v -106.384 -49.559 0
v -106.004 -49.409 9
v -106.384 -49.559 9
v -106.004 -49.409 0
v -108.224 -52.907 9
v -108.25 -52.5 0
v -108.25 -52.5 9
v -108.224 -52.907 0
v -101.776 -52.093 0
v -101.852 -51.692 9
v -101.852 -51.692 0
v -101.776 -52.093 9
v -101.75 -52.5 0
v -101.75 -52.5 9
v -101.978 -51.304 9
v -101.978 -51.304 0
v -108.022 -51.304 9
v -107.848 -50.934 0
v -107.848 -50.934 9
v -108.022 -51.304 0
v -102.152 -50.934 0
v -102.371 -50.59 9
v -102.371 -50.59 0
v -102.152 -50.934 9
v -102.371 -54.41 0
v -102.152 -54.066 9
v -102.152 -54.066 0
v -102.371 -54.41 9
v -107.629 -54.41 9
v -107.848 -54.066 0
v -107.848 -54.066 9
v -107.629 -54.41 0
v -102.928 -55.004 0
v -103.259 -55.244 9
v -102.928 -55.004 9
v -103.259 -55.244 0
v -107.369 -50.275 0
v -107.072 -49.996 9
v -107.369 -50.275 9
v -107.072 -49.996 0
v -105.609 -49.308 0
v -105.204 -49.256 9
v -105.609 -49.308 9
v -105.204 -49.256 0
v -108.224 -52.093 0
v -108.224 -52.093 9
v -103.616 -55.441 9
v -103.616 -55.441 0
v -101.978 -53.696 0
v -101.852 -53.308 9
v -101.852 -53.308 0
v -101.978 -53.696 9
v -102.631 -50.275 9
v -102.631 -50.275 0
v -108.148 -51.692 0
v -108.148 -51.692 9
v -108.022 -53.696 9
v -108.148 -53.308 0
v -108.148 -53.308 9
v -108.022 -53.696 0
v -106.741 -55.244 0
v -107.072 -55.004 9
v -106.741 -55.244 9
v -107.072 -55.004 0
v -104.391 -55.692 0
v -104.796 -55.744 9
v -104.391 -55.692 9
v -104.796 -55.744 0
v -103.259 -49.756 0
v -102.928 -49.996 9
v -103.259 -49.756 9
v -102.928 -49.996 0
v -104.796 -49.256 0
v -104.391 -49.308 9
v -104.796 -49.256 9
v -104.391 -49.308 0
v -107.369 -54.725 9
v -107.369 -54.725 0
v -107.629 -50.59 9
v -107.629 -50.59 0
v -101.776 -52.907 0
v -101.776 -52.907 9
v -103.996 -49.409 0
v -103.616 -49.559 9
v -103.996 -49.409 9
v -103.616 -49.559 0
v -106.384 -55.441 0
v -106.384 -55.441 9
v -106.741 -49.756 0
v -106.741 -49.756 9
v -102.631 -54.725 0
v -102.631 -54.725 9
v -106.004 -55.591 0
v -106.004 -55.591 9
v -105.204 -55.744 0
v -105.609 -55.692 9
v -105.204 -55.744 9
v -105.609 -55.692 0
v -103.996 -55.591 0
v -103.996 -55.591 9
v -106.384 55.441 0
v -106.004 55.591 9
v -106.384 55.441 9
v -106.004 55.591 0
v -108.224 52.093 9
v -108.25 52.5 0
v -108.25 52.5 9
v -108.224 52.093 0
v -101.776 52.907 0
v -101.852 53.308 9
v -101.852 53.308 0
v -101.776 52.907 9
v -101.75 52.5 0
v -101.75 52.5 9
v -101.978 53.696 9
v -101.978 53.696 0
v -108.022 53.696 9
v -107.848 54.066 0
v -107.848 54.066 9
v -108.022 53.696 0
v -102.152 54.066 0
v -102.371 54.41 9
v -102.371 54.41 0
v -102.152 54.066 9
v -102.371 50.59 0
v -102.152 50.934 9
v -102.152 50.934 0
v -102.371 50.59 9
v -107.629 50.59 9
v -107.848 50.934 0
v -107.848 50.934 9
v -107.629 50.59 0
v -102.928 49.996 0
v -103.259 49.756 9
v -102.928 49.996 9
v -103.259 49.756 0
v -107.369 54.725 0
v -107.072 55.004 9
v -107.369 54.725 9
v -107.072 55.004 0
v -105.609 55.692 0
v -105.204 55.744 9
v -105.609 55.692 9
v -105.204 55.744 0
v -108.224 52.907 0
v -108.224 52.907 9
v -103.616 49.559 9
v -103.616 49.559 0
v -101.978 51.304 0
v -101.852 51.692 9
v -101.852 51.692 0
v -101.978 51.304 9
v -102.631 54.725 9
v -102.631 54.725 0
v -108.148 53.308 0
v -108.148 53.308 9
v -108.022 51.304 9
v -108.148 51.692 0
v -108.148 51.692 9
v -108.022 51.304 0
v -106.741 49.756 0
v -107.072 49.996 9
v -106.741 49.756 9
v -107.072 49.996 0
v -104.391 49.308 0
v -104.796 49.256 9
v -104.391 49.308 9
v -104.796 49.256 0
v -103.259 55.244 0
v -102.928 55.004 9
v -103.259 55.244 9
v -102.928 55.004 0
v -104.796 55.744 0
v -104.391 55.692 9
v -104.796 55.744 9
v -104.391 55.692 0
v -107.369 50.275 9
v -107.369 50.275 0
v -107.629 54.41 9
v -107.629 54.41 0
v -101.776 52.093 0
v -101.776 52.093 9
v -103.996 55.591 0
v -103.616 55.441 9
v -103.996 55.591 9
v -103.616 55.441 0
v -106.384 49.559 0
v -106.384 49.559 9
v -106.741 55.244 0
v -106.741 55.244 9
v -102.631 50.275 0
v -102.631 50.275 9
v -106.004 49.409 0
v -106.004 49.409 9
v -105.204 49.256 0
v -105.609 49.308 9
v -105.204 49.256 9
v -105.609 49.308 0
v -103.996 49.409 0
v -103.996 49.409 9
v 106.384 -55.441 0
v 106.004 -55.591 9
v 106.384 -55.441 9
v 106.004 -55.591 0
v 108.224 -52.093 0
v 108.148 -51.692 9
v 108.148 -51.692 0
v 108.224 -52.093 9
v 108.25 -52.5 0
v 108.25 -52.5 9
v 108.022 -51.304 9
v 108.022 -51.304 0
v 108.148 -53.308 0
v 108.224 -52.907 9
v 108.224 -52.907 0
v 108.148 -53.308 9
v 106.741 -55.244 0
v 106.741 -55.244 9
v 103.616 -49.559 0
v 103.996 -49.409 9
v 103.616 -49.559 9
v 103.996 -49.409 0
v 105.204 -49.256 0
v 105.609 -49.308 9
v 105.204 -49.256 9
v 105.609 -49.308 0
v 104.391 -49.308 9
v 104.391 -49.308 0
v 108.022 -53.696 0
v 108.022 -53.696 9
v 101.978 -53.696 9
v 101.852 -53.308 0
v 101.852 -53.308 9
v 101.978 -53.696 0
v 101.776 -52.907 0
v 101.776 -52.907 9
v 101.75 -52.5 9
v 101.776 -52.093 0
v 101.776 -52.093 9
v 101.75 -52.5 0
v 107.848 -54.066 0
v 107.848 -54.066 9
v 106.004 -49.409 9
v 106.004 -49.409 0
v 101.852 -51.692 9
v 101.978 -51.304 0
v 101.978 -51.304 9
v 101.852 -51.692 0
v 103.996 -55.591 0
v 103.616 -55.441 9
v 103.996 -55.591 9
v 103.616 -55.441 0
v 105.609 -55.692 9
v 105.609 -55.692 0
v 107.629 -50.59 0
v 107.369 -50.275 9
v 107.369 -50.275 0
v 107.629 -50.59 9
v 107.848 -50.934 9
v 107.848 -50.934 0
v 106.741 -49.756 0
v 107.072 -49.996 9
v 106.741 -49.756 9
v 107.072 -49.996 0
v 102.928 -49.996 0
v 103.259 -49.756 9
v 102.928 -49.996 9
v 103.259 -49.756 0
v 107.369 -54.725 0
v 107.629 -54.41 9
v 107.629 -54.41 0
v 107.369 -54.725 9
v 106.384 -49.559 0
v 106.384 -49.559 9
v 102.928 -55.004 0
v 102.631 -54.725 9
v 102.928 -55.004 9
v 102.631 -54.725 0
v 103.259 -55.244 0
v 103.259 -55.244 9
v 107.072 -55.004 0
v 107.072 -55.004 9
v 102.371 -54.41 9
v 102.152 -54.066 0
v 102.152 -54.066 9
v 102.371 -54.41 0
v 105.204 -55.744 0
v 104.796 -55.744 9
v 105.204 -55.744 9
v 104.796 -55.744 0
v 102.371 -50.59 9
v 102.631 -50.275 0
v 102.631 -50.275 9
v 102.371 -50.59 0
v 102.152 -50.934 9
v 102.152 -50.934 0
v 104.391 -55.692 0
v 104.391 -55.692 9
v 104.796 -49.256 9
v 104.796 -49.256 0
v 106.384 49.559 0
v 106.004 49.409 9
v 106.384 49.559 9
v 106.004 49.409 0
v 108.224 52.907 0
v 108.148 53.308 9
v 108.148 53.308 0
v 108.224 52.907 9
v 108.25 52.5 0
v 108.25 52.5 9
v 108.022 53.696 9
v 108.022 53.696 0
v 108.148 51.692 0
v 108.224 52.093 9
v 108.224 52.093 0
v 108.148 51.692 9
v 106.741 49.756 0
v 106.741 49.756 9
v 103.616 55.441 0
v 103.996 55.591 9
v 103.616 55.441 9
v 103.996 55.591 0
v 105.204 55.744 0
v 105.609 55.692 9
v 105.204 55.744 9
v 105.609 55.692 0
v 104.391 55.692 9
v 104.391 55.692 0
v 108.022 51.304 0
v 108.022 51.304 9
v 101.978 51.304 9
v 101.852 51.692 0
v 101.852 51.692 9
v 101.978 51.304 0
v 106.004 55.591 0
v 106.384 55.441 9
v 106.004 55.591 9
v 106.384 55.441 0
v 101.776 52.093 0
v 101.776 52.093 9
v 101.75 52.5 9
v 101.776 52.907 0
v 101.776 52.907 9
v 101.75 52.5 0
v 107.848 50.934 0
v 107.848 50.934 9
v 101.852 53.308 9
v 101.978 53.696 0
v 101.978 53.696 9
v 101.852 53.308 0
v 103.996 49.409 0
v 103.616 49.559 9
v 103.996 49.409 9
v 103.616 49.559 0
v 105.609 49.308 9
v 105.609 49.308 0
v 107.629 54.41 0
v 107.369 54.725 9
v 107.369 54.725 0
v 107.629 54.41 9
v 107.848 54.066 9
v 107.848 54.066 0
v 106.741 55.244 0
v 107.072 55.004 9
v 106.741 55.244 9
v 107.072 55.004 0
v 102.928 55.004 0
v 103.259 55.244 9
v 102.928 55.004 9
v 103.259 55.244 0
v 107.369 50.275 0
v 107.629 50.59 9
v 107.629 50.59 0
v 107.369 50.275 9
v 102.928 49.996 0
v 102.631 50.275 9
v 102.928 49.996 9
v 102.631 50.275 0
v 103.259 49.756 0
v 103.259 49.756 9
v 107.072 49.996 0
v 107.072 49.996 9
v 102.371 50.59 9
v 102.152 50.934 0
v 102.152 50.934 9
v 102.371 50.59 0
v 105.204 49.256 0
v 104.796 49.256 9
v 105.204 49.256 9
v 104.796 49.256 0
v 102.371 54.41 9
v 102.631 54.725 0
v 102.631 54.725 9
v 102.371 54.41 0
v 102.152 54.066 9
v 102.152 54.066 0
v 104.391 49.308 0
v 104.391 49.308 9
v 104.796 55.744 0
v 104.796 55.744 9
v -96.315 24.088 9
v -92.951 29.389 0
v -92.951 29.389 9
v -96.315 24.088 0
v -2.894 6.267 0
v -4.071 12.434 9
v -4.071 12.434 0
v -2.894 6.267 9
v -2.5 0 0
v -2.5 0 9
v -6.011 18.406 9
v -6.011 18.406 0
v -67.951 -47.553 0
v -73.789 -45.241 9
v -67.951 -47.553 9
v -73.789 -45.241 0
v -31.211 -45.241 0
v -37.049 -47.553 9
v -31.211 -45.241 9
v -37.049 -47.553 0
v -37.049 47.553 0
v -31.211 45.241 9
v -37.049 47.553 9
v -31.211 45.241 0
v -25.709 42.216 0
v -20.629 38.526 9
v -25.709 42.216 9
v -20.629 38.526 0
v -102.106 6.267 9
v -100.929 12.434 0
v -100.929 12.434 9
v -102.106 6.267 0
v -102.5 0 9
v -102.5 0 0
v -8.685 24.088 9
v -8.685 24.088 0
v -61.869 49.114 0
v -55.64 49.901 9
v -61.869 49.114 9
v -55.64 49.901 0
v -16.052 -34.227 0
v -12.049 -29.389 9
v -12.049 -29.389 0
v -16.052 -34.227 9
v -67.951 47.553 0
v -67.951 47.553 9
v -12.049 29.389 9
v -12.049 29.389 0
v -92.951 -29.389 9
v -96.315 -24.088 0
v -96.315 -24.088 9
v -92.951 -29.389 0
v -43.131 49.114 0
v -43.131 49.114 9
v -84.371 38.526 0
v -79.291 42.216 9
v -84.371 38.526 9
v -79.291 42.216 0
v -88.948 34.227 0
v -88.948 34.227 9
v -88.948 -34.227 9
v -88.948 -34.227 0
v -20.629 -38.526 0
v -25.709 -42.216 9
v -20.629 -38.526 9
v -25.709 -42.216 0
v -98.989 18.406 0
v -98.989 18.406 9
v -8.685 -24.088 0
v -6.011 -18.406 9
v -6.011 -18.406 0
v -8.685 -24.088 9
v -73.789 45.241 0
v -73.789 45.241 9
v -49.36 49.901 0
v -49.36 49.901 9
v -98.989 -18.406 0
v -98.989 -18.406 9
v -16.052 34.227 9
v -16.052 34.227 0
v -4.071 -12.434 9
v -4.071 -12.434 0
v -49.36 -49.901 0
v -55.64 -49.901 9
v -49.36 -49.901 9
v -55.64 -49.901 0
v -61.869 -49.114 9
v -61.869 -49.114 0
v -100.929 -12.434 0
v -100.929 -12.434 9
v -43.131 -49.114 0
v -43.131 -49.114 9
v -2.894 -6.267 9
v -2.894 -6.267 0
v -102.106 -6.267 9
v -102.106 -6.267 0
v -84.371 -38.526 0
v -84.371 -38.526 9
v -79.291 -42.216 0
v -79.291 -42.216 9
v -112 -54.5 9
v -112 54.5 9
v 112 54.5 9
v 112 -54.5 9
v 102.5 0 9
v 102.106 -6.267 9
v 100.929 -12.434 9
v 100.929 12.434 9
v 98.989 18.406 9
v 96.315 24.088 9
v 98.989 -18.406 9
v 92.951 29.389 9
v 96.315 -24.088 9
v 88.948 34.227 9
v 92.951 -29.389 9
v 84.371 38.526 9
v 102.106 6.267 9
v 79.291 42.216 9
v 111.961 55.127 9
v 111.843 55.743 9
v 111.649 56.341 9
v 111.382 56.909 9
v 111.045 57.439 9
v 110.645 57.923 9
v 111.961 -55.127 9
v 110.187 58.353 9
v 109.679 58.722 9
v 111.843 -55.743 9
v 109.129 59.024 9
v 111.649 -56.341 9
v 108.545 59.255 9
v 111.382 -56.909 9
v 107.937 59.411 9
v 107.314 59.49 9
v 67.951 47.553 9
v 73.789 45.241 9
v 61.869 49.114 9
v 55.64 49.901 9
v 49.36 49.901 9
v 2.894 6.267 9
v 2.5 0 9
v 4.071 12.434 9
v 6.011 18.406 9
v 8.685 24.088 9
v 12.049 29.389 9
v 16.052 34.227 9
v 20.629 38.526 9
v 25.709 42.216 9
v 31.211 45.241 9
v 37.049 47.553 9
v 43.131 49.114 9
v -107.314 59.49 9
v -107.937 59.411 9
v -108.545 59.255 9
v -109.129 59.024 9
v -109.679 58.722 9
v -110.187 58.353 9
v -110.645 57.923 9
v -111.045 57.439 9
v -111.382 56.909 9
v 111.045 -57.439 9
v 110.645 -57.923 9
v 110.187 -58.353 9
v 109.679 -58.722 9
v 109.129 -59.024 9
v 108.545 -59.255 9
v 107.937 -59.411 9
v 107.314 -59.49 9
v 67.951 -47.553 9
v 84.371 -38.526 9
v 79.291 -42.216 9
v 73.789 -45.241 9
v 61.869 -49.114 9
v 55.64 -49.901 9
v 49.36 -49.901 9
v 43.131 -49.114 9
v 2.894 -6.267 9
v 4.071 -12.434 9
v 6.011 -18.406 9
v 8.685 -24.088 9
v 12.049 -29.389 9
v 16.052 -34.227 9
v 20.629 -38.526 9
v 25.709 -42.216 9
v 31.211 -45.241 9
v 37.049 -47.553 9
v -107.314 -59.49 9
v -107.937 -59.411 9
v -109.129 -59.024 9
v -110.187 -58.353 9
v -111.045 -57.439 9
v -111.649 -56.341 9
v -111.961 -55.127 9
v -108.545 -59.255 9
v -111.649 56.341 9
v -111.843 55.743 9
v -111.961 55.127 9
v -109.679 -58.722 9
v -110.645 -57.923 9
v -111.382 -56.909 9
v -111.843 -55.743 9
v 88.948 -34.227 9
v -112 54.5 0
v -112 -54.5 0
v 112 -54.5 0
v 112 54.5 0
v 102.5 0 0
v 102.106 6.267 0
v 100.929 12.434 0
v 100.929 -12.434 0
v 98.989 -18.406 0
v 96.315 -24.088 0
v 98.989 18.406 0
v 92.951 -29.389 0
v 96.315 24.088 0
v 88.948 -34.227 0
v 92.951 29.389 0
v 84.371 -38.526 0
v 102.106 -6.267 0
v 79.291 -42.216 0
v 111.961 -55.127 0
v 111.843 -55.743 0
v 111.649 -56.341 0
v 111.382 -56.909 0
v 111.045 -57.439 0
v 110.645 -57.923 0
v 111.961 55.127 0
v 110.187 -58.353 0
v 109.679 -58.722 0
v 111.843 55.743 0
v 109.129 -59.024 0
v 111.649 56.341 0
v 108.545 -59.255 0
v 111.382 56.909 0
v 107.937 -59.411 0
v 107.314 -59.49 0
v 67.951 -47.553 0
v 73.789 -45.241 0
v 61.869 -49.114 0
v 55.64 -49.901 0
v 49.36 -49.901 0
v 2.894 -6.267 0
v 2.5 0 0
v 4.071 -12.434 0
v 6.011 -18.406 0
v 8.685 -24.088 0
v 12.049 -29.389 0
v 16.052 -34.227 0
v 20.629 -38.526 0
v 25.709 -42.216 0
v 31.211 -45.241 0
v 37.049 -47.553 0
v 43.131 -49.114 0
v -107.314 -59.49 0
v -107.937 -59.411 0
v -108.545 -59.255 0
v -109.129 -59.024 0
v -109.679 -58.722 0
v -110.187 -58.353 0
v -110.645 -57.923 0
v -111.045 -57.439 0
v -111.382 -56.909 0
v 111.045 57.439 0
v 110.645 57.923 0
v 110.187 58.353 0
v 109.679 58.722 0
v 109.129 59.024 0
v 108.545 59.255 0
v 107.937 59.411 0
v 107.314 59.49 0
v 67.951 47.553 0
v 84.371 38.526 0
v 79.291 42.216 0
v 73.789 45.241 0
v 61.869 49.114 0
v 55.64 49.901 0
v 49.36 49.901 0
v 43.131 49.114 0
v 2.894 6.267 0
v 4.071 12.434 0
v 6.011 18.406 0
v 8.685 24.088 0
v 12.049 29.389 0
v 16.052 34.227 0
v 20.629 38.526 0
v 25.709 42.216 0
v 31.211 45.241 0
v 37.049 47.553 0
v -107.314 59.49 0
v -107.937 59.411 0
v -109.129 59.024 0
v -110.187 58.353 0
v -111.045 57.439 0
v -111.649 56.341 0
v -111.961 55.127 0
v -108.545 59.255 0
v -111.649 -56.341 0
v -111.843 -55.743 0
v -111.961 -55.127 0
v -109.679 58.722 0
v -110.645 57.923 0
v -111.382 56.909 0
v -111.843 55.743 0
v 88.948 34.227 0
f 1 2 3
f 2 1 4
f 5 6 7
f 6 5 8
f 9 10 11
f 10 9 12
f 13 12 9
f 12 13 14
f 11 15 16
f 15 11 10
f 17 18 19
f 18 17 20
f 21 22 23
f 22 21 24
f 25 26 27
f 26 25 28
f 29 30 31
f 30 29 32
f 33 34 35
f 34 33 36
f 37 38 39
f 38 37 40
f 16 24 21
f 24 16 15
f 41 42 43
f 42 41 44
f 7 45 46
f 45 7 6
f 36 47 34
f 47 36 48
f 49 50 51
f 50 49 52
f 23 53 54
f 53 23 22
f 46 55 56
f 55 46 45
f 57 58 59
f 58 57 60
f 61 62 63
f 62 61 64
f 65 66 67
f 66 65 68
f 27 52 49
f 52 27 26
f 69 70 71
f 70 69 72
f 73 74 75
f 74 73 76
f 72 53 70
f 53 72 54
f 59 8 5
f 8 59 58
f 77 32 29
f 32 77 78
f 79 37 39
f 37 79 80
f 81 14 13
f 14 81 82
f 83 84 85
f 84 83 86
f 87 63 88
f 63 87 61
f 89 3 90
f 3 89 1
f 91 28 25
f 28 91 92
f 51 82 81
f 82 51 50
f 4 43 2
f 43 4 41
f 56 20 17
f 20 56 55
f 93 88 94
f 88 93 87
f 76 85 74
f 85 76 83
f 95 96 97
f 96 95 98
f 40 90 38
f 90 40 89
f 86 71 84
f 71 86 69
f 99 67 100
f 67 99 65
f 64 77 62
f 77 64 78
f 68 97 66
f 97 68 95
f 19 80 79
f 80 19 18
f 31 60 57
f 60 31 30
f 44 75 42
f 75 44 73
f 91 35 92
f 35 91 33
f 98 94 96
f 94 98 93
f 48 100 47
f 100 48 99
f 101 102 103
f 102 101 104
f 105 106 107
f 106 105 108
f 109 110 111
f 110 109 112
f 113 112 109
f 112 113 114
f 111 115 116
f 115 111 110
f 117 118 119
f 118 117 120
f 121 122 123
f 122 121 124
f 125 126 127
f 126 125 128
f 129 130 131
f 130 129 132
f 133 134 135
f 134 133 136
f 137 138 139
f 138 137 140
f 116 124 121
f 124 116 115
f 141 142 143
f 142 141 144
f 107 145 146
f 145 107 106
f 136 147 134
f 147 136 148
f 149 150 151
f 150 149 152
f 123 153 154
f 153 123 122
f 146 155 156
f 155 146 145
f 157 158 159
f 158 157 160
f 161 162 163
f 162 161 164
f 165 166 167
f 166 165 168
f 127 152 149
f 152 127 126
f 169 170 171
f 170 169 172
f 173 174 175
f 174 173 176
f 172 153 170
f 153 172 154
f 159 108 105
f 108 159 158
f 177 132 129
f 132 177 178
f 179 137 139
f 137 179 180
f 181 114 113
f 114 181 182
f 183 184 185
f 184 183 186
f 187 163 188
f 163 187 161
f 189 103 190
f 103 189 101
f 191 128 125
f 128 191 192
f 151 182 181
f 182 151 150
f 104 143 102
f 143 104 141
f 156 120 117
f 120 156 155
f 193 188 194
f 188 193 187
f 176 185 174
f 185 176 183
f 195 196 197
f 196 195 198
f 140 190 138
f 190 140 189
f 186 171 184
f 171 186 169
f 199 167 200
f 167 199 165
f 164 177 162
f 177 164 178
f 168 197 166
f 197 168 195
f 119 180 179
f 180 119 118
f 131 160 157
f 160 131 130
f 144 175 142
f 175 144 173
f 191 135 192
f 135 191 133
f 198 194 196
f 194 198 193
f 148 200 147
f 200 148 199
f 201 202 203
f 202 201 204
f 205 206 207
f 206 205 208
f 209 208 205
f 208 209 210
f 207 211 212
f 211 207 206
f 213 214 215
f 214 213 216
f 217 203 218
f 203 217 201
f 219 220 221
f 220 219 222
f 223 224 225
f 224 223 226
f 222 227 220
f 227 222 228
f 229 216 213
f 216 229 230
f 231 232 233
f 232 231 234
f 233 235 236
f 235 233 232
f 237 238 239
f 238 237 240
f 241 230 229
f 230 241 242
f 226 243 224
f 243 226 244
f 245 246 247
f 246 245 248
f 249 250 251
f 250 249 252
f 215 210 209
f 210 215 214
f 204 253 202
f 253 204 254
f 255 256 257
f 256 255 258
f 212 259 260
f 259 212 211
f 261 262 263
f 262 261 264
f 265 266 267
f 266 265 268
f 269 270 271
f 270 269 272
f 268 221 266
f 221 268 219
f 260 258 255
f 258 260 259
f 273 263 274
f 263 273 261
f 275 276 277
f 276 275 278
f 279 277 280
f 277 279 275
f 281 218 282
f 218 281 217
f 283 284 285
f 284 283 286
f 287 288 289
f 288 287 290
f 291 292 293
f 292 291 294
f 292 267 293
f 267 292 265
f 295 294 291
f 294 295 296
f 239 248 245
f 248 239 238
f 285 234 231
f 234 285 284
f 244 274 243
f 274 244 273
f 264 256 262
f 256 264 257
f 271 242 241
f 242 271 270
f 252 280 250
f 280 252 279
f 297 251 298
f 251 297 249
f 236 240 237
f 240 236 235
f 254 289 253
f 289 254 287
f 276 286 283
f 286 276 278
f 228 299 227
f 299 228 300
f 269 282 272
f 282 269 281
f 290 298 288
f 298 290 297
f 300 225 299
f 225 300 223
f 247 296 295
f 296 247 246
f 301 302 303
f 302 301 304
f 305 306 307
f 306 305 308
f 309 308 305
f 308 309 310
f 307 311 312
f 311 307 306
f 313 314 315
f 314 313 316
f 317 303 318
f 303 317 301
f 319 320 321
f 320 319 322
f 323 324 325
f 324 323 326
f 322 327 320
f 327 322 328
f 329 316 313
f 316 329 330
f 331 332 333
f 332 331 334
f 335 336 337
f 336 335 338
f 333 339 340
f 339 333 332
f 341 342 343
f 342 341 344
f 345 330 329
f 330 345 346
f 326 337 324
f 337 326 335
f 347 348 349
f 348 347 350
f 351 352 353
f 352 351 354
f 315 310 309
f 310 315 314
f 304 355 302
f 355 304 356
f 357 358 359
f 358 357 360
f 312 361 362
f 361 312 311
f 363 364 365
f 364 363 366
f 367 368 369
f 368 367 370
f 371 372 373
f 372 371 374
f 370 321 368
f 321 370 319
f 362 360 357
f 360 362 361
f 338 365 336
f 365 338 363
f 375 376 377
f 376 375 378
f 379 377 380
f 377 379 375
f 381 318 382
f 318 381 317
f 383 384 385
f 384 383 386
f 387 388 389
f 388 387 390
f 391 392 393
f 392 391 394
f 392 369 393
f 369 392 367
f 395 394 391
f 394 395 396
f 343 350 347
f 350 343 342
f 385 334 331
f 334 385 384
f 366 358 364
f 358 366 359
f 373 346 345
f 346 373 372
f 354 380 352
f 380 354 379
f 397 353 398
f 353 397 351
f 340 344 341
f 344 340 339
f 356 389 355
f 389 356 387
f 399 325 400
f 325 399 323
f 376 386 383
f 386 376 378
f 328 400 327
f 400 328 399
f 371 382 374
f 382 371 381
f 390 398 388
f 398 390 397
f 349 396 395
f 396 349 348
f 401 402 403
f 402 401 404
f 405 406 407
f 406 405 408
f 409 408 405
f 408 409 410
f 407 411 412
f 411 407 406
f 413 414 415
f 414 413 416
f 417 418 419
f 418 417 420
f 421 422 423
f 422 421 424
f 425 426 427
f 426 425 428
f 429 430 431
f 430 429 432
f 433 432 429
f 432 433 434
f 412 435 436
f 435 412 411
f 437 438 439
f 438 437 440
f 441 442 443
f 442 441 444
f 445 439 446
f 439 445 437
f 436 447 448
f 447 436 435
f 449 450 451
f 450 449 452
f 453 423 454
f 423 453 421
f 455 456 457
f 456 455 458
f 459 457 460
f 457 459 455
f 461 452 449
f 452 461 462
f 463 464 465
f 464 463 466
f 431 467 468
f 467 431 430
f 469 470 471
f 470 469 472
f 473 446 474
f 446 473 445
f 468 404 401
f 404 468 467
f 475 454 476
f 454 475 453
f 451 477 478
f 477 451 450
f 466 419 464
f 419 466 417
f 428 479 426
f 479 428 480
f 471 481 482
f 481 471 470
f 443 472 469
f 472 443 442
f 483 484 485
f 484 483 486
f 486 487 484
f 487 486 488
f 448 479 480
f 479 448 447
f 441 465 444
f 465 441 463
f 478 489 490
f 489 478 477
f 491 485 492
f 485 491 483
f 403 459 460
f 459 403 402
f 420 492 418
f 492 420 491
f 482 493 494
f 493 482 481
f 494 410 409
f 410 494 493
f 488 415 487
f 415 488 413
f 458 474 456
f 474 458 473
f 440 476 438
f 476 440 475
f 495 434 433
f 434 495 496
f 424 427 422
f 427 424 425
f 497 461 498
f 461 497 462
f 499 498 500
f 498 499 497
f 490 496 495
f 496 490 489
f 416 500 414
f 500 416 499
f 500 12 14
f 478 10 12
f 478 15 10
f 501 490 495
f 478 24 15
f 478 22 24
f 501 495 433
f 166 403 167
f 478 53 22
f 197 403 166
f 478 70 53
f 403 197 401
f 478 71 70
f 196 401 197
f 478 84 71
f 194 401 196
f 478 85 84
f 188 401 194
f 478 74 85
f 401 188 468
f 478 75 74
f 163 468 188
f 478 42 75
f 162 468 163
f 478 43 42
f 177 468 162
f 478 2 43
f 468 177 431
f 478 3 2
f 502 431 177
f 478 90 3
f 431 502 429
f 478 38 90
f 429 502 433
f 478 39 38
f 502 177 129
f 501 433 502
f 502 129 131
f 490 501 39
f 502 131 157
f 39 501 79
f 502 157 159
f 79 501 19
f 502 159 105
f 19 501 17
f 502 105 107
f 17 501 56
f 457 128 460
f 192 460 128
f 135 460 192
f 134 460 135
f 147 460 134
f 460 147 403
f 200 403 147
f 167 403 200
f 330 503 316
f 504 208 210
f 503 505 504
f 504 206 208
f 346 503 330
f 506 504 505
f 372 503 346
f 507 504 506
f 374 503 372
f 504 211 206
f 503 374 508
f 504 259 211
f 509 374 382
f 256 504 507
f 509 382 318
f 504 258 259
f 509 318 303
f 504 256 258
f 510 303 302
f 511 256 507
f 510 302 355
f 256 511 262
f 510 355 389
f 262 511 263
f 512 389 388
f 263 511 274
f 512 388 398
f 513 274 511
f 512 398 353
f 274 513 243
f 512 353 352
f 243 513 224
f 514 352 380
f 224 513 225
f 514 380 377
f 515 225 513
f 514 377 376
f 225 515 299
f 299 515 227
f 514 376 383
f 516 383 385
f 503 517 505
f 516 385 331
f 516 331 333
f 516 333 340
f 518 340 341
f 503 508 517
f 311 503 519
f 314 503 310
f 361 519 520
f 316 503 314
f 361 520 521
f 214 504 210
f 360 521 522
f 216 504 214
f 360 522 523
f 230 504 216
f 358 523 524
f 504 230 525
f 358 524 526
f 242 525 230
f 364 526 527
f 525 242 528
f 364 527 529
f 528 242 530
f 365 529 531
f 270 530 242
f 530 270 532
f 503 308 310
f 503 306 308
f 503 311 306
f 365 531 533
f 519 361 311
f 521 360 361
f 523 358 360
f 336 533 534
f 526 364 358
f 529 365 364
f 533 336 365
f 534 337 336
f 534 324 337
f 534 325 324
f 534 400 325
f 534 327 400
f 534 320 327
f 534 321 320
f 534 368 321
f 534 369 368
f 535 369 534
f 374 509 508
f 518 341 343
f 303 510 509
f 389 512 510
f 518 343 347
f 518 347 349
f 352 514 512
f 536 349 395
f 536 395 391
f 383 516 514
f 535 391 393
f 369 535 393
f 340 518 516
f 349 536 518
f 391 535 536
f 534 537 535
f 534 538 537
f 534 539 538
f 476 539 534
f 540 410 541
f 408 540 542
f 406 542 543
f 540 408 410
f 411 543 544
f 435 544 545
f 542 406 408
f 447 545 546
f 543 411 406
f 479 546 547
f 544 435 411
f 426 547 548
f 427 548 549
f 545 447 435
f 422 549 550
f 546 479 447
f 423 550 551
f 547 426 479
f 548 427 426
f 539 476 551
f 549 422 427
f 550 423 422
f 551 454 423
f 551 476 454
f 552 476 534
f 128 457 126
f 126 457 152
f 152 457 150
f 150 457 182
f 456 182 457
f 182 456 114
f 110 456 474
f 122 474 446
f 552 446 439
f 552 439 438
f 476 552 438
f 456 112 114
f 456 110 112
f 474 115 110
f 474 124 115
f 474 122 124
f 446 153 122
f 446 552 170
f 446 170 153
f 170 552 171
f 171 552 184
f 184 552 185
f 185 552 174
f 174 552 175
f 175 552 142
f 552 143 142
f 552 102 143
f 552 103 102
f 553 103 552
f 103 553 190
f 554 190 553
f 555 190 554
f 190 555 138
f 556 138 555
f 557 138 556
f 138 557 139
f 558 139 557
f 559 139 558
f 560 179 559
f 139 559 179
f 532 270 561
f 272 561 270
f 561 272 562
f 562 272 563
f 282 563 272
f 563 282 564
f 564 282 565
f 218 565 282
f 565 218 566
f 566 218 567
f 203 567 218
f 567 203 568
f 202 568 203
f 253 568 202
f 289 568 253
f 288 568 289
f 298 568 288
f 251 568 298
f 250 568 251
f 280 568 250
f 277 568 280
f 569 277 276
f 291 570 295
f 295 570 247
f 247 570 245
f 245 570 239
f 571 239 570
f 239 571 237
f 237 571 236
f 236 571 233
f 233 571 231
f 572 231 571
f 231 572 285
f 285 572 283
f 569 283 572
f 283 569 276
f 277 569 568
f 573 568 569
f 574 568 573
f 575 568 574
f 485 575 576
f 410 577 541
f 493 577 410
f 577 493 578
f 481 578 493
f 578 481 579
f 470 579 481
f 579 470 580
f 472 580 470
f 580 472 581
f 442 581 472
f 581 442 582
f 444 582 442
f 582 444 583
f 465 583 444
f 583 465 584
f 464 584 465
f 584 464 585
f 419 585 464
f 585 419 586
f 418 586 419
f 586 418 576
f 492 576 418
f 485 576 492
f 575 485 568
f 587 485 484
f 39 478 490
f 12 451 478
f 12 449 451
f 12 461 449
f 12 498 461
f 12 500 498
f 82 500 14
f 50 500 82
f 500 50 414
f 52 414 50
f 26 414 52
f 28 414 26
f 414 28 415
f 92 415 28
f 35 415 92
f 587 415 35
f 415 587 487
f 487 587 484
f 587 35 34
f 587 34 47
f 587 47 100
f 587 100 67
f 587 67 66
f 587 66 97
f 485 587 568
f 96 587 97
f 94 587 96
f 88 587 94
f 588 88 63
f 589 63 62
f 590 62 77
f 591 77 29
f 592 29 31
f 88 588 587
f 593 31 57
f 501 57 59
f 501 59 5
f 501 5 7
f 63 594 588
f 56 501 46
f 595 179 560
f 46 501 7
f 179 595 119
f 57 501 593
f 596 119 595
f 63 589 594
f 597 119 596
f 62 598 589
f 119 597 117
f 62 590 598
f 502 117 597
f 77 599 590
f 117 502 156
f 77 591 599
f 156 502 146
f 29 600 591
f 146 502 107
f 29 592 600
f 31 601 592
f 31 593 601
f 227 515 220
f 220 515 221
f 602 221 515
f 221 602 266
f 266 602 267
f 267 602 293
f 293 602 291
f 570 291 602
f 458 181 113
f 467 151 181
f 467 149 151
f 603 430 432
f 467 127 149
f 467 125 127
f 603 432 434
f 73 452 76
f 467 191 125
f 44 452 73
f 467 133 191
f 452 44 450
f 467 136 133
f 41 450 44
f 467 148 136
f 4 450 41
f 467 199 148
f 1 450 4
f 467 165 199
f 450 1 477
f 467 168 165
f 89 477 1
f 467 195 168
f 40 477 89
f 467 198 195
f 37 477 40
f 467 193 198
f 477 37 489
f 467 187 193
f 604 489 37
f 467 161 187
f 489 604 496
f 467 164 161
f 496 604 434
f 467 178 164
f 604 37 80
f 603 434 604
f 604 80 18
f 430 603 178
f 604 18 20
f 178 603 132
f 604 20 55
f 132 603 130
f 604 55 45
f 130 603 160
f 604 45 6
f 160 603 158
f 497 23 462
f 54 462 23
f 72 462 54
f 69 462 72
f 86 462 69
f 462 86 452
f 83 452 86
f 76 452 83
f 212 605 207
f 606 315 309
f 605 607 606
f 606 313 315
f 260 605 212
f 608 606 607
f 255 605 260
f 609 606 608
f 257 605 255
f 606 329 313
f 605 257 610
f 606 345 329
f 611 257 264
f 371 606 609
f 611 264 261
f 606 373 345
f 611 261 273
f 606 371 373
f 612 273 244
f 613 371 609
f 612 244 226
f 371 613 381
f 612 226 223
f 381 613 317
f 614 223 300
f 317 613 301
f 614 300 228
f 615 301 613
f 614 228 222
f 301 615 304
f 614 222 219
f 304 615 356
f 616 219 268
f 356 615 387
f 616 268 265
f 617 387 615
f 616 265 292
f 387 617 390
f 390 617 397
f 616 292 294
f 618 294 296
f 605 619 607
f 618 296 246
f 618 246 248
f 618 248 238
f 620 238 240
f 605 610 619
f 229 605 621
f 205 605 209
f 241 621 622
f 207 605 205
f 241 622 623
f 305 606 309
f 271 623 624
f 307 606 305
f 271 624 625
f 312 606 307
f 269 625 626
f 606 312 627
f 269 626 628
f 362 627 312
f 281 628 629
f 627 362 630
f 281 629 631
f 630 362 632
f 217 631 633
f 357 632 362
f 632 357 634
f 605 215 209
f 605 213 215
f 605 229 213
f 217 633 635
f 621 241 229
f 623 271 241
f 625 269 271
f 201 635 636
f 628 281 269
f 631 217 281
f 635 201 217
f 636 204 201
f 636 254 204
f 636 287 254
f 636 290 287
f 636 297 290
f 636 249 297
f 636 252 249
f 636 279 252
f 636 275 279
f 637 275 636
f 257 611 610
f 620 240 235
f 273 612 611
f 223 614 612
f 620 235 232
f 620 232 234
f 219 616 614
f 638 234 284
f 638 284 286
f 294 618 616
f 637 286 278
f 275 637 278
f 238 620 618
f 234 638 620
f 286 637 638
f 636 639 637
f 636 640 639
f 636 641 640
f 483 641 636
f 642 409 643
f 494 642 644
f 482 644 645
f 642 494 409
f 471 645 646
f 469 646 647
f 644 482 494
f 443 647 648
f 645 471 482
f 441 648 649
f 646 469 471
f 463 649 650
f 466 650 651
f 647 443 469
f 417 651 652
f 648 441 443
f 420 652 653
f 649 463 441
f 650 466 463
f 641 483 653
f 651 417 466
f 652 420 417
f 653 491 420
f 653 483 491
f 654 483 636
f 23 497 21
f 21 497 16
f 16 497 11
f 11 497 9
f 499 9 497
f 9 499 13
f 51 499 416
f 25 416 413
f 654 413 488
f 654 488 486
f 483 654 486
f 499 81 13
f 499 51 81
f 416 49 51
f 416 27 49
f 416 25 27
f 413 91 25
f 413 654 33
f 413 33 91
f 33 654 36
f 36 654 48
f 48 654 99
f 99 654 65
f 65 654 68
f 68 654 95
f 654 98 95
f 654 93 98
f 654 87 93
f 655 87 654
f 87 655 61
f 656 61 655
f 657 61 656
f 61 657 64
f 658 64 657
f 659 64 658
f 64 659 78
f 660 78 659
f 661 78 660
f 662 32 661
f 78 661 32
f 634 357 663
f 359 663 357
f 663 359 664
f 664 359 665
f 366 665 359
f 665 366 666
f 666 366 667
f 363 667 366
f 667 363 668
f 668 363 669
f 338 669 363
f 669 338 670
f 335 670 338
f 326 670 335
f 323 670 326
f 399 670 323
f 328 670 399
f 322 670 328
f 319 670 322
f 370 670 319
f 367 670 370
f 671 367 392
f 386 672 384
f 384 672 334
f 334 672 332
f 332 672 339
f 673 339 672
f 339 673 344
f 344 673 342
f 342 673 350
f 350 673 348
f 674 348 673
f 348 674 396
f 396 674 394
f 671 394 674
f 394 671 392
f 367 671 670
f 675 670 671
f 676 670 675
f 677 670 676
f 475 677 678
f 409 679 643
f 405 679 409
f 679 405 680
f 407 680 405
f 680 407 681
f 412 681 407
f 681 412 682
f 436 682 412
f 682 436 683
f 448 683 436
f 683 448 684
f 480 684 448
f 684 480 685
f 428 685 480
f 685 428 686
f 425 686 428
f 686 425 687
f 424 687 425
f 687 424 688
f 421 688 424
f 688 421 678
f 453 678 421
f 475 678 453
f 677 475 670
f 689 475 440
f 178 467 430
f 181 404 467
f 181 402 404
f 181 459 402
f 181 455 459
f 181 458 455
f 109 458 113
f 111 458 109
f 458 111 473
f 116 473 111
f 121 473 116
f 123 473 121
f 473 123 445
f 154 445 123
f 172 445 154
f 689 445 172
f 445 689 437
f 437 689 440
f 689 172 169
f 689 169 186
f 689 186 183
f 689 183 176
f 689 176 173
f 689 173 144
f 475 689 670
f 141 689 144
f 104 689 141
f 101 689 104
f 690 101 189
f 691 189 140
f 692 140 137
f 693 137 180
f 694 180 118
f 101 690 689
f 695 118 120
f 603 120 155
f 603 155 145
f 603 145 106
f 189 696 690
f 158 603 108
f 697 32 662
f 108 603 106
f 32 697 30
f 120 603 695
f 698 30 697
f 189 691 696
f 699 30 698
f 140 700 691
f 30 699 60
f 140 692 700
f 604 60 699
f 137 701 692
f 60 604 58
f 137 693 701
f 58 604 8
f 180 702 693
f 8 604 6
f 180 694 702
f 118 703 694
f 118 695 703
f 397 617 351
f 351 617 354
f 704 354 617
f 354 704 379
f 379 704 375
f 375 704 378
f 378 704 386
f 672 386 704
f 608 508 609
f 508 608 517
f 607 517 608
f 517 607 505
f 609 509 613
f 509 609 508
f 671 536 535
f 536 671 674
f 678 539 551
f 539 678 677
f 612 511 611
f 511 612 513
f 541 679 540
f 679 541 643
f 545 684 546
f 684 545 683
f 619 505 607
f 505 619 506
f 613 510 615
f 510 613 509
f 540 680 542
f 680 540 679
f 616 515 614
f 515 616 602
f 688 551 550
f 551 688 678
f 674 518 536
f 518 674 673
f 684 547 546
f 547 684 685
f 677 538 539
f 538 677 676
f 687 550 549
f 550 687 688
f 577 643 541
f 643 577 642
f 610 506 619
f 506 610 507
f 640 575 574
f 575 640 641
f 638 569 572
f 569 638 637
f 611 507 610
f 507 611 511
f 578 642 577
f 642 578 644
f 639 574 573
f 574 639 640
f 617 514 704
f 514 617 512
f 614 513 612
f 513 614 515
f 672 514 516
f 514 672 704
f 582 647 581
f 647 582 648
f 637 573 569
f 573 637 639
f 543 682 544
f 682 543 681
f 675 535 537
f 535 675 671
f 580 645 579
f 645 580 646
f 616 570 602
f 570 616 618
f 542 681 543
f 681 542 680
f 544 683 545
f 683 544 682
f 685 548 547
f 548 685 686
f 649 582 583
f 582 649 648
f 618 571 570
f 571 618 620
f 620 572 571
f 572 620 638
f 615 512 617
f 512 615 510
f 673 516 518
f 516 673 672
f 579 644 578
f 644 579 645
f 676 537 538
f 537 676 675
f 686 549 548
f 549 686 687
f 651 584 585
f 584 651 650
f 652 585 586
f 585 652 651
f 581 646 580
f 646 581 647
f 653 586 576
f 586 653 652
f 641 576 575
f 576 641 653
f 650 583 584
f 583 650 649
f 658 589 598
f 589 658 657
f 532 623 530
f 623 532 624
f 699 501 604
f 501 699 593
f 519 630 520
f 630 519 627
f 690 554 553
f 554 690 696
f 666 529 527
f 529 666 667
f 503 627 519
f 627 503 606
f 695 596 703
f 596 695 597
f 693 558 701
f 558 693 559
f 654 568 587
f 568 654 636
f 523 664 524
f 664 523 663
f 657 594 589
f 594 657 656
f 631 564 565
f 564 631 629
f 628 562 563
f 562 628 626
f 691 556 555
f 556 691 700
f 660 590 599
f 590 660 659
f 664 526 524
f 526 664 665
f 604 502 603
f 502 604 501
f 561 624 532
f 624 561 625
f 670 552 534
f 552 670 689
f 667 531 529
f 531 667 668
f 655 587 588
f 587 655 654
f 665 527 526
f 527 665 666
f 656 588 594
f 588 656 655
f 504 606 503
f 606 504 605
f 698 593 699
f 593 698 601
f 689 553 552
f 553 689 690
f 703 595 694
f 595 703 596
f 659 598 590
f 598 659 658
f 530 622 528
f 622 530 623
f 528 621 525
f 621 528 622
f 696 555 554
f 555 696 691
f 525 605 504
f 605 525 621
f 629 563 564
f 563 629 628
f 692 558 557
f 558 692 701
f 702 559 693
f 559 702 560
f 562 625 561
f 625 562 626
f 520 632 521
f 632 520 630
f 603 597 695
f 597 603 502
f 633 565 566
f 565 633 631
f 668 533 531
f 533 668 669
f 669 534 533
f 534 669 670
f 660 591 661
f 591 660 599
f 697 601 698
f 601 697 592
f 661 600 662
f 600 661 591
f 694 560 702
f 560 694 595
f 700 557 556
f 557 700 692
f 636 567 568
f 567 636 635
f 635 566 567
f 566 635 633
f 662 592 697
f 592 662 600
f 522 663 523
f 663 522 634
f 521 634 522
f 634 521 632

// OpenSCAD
$fn = 50;

difference() {
	union() {
		hull() {
			translate(v = [-107.0, 54.5, 0]) {
				cylinder(h = 9, r = 5);
			}
			translate(v = [107.0, 54.5, 0]) {
				cylinder(h = 9, r = 5);
			}
			translate(v = [-107.0, -54.5, 0]) {
				cylinder(h = 9, r = 5);
			}
			translate(v = [107.0, -54.5, 0]) {
				cylinder(h = 9, r = 5);
			}
		}
	}
	union() {
		translate(v = [-105.0, -52.5, -100.0]) {
			cylinder(h = 200, r = 3.25);
		}
		translate(v = [-105.0, 52.5, -100.0]) {
			cylinder(h = 200, r = 3.25);
		}
		translate(v = [105.0, -52.5, -100.0]) {
			cylinder(h = 200, r = 3.25);
		}
		translate(v = [105.0, 52.5, -100.0]) {
			cylinder(h = 200, r = 3.25);
		}
		translate(v = [-105.0, -52.5, -100.0]) {
			cylinder(h = 200, r = 1.8);
		}
		translate(v = [-105.0, 52.5, -100.0]) {
			cylinder(h = 200, r = 1.8);
		}
		translate(v = [105.0, -52.5, -100.0]) {
			cylinder(h = 200, r = 1.8);
		}
		translate(v = [105.0, 52.5, -100.0]) {
			cylinder(h = 200, r = 1.8);
		}
		translate(v = [-52.5, 0, 0.0]) {
			cylinder(h = 9, r = 50.0);
		}
		translate(v = [52.5, 0, 0.0]) {
			cylinder(h = 9, r = 50.0);
		}
	}
}
